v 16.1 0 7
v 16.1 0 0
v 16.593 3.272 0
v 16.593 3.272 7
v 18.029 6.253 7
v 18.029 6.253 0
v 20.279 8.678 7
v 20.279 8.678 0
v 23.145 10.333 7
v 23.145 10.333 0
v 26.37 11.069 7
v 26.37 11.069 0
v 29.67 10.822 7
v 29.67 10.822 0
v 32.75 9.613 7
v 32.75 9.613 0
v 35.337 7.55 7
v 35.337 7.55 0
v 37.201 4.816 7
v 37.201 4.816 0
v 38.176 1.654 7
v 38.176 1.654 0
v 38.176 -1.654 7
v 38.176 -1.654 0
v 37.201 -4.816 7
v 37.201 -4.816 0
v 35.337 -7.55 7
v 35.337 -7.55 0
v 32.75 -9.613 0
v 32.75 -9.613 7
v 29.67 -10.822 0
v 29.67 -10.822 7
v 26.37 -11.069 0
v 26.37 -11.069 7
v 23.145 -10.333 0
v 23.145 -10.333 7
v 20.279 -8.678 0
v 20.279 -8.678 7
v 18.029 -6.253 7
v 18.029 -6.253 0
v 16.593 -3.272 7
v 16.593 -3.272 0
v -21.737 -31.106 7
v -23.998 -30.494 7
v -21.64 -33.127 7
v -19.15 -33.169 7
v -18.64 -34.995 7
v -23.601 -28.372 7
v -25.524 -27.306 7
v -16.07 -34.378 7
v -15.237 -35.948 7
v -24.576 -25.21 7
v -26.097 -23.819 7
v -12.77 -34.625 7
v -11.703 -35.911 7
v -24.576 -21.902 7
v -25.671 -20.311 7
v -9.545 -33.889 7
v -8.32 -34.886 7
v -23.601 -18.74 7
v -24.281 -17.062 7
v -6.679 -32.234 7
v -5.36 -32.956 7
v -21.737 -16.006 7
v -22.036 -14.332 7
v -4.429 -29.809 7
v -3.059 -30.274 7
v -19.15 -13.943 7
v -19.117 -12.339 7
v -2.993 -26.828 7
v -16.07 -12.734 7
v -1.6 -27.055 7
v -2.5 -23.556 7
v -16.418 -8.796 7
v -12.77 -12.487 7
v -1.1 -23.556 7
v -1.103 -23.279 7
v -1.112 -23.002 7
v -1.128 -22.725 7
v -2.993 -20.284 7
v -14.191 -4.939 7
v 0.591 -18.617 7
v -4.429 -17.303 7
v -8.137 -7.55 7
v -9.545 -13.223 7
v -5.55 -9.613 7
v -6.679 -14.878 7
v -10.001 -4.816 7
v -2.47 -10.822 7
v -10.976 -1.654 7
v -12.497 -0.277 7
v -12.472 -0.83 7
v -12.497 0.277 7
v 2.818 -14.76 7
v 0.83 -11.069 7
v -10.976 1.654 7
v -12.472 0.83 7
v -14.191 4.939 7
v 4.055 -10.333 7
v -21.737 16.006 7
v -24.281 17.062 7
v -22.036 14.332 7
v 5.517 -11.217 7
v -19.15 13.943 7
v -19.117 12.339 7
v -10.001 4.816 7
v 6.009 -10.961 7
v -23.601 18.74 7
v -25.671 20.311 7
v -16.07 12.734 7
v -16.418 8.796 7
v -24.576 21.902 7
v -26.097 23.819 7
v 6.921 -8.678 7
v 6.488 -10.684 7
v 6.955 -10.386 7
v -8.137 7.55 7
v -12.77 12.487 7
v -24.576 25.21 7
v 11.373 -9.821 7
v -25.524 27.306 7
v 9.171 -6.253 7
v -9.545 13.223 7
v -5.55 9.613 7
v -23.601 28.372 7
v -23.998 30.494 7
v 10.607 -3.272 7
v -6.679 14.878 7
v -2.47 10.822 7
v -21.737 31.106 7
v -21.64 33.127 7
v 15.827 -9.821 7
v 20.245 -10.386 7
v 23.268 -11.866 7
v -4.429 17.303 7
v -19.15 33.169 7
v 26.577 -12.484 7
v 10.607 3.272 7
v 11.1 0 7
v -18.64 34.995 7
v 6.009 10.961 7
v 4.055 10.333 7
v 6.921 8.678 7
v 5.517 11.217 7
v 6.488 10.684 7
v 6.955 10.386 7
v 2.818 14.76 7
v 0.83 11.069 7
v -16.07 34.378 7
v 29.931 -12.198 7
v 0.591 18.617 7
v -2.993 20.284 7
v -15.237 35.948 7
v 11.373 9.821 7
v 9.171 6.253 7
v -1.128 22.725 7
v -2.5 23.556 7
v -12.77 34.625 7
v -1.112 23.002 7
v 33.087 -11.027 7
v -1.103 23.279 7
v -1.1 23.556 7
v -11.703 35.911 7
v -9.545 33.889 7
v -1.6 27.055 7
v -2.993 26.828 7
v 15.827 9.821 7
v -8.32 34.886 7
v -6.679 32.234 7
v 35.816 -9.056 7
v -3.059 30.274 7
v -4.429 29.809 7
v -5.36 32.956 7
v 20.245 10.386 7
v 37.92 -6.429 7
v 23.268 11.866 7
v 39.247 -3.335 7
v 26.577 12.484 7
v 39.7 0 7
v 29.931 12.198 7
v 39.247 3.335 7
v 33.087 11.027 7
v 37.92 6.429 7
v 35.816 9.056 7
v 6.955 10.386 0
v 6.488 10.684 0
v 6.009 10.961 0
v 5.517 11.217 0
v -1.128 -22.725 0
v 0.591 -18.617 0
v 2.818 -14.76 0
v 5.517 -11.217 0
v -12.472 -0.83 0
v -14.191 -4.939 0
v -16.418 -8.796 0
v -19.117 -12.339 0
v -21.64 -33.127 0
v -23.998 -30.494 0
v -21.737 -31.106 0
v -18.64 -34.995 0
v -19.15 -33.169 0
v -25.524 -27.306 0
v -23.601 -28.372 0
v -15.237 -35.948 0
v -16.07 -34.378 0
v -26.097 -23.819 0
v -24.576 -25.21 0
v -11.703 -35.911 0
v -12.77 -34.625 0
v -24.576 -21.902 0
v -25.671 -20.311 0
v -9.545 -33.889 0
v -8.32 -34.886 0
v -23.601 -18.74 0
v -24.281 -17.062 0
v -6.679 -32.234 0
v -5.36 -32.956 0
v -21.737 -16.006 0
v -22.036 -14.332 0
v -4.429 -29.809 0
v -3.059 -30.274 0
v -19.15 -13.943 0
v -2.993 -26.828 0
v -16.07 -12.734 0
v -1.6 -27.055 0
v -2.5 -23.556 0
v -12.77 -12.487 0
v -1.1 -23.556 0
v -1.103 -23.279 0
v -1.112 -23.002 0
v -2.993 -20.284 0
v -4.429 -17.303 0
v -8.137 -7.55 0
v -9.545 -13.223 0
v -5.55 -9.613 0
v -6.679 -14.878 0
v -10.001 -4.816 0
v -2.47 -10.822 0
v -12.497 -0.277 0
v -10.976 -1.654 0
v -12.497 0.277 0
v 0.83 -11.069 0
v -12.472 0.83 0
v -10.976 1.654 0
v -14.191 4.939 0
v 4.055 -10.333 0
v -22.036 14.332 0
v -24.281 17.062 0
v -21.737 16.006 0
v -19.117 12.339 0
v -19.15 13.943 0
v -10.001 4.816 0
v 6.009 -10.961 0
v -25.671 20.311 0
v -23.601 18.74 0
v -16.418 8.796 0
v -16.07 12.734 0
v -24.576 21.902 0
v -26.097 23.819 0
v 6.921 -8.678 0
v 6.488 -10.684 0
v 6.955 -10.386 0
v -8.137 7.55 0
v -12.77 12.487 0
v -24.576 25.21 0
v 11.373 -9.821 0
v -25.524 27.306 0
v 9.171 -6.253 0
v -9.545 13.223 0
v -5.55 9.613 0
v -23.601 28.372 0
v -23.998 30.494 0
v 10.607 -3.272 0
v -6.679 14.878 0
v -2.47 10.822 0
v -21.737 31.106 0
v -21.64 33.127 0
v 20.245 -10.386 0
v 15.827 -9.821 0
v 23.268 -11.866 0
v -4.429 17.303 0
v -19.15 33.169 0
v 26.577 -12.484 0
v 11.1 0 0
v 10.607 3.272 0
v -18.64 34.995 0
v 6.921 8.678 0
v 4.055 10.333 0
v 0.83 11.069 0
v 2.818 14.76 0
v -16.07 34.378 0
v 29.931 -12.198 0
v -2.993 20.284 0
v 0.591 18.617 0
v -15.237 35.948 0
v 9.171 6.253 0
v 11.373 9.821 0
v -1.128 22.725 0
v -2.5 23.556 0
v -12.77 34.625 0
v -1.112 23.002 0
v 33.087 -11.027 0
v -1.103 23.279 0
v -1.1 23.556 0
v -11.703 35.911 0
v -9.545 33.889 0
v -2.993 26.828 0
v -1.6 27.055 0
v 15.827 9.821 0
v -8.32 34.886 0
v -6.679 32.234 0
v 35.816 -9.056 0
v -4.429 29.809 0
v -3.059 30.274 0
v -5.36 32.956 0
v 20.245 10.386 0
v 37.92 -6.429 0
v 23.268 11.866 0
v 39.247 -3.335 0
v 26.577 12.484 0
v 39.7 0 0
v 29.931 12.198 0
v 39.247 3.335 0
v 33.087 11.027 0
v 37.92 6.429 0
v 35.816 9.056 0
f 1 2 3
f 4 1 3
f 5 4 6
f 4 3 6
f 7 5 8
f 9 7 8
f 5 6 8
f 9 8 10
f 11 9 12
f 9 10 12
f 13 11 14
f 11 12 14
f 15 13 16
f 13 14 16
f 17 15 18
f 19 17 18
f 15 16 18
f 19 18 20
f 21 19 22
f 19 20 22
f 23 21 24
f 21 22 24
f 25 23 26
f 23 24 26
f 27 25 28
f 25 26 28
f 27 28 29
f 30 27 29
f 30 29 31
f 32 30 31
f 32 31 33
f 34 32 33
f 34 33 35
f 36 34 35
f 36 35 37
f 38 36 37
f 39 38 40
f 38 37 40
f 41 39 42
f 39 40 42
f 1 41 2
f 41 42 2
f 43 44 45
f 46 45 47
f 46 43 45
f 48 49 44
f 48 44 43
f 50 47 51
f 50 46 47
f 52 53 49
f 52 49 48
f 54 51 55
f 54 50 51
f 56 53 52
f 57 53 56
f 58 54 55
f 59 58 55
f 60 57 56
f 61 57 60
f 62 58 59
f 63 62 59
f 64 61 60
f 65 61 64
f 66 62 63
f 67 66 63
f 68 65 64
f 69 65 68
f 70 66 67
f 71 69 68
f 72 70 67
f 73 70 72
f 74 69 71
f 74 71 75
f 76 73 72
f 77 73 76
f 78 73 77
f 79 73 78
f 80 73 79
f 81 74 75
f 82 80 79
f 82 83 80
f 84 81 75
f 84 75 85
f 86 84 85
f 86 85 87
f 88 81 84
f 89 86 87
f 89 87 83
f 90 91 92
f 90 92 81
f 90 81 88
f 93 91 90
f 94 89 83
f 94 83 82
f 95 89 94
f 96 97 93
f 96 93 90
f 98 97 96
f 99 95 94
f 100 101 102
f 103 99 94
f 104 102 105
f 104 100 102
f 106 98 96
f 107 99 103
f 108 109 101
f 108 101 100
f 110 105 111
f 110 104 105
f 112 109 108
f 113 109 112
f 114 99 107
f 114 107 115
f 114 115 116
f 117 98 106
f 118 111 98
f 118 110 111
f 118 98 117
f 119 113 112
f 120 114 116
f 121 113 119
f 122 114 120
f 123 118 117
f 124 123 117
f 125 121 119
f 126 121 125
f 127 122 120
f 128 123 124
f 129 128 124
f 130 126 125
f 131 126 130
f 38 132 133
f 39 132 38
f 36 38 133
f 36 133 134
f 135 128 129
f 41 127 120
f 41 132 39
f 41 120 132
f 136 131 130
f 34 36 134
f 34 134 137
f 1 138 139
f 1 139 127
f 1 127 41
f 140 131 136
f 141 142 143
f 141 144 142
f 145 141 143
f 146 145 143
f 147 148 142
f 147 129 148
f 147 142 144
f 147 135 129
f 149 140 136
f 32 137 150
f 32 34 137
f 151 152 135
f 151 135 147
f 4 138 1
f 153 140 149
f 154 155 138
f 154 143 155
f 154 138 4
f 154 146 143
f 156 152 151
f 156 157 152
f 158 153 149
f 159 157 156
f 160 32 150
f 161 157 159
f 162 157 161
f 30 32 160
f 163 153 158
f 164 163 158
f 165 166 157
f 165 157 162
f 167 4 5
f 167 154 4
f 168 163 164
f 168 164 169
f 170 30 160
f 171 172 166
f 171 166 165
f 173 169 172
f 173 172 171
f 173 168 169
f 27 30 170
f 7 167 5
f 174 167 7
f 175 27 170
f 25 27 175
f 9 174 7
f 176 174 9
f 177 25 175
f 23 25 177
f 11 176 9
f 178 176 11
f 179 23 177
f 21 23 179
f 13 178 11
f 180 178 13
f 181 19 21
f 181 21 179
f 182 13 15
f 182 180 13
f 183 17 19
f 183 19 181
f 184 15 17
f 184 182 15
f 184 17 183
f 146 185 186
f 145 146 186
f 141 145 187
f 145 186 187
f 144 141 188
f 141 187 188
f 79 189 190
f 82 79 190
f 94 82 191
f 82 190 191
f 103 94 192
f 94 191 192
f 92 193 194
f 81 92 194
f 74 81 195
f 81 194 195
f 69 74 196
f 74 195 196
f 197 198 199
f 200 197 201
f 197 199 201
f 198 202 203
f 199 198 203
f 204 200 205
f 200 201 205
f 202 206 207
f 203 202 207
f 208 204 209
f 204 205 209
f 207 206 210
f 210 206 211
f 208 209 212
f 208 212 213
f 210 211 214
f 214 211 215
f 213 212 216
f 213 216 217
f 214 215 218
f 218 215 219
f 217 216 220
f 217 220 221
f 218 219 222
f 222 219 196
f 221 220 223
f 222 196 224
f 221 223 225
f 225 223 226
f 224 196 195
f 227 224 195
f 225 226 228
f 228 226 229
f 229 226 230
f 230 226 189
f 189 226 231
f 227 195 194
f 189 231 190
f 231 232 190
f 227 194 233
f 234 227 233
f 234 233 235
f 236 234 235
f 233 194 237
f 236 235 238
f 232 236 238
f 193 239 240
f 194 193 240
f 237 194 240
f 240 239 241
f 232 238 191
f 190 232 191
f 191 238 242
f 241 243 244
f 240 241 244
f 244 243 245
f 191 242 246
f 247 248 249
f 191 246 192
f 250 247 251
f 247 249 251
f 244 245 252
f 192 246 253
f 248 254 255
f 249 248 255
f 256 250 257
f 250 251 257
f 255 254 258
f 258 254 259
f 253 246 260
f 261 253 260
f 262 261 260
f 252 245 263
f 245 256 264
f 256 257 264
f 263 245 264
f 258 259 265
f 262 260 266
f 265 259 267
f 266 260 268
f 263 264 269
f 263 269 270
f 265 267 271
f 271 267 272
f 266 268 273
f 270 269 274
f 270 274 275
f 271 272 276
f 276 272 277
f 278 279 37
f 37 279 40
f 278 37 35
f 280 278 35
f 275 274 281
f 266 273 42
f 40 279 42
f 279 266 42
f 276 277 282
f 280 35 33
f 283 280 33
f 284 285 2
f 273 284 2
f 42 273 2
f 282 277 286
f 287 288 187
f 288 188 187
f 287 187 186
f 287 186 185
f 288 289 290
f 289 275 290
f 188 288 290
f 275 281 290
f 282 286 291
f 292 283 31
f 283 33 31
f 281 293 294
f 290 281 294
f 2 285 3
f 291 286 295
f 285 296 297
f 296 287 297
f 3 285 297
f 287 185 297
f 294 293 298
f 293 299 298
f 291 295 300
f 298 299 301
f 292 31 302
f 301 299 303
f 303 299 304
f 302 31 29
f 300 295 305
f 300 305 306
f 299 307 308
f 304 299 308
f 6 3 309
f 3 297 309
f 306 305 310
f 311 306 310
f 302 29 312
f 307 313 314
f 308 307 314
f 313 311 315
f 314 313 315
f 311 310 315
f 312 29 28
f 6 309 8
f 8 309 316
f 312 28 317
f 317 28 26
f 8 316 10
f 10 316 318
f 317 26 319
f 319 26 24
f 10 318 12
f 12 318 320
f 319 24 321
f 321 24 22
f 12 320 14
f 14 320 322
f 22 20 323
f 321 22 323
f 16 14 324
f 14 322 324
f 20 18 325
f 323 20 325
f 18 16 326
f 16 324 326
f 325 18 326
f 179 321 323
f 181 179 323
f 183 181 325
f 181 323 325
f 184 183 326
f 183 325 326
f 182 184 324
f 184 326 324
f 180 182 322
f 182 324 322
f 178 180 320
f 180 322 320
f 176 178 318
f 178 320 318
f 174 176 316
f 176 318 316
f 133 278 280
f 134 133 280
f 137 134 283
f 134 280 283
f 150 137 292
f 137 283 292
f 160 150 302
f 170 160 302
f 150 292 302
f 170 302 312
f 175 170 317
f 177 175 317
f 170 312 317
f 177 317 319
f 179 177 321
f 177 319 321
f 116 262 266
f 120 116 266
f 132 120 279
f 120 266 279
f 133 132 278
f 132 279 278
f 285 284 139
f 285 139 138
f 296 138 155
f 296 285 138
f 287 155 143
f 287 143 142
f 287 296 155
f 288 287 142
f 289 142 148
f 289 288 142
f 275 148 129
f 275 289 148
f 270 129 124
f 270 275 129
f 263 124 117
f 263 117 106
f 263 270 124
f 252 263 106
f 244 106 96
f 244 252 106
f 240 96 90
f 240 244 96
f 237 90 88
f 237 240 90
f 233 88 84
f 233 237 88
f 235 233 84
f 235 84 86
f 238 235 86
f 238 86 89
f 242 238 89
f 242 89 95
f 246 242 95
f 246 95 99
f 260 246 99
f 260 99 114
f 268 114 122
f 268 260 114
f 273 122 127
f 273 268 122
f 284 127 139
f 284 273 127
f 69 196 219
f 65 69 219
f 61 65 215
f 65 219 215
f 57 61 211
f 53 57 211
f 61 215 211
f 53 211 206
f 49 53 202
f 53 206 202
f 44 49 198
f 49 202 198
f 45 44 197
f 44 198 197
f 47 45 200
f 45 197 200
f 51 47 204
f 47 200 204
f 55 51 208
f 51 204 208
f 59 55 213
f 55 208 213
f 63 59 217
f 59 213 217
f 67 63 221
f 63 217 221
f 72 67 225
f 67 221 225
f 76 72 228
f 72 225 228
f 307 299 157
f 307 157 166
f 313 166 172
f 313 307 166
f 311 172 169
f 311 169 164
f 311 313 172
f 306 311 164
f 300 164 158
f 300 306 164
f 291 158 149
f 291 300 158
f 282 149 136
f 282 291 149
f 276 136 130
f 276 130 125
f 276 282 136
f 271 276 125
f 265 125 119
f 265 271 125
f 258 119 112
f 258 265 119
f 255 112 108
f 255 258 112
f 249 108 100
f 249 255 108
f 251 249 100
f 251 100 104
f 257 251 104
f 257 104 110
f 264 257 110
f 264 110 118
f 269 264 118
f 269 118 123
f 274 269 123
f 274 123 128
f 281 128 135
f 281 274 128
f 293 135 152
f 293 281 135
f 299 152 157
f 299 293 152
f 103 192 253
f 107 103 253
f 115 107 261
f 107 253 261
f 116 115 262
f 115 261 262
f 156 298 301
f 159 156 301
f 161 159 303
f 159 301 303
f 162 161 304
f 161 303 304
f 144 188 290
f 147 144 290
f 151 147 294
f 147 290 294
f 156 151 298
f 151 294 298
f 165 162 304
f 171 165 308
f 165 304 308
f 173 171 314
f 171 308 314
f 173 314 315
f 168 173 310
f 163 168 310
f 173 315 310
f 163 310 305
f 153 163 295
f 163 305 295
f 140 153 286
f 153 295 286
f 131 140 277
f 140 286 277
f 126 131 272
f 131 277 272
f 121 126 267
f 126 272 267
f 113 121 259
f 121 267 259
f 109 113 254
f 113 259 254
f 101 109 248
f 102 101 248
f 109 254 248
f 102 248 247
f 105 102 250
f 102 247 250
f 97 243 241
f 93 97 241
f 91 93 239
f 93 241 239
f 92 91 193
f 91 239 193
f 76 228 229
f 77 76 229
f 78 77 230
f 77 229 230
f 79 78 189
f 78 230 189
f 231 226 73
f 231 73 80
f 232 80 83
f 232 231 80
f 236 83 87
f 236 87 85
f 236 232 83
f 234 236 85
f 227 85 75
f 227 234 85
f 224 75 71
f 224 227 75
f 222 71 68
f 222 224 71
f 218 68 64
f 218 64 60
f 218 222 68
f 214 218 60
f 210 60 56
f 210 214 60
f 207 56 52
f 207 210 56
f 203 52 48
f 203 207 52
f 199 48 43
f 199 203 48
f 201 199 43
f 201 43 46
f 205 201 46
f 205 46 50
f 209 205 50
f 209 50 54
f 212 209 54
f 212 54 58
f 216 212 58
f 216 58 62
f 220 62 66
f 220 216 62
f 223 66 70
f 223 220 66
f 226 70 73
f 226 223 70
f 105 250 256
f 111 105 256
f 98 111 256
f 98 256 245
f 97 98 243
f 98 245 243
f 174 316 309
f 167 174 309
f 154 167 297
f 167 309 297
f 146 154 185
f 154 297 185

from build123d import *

# Parameters (mm, degrees)
F0_R     = 11.1
F1_DEPTH = 7


with BuildPart() as f1:
    # F0 (on Top) → F1 (new body)
    with BuildSketch(Plane.XY):
        with BuildLine():
            ThreePointArc((6.955402, -10.386163), (11.02707, -5.886742), (12.5, 0))
            ThreePointArc((12.5, 0), (11.02707, 5.886742), (6.955402, 10.386163))
            ThreePointArc((6.955402, 10.386163), (6.25, 10.825318), (5.51698, 11.216636))
            ThreePointArc((5.51698, 11.216636), (-6.25, 10.825318), (-12.472382, 0.830473))
            ThreePointArc((-12.472382, 0.830473), (-12.5, 0), (-12.472382, -0.830473))
            ThreePointArc((-12.472382, -0.830473), (-6.25, -10.825318), (5.51698, -11.216636))
            ThreePointArc((5.51698, -11.216636), (6.25, -10.825318), (6.955402, -10.386163))
        make_face()
        Circle(F0_R, mode=Mode.SUBTRACT)
        with BuildLine():
            ThreePointArc((6.955402, 10.386163), (11.02707, 5.886742), (12.5, 0))
            Line((12.5, 0), (14.7, 0))
            ThreePointArc((14.7, 0), (16.17293, 5.886742), (20.244598, 10.386163))
            ThreePointArc((20.244598, 10.386163), (13.6, 9.749651), (6.955402, 10.386163))
        make_face()
        with BuildLine():
            Line((14.7, 0), (12.5, 0))
            ThreePointArc((12.5, 0), (11.02707, -5.886742), (6.955402, -10.386163))
            ThreePointArc((6.955402, -10.386163), (13.6, -9.749651), (20.244598, -10.386163))
            ThreePointArc((20.244598, -10.386163), (16.17293, -5.886742), (14.7, 0))
        make_face()
        with BuildLine():
            ThreePointArc((38.3, 0), (27.2, 11.1), (16.1, 0))
            ThreePointArc((16.1, 0), (27.2, -11.1), (38.3, 0))
        make_face()
        with BuildLine():
            ThreePointArc((20.244598, 10.386163), (16.17293, 5.886742), (14.7, 0))
            ThreePointArc((14.7, 0), (16.17293, -5.886742), (20.244598, -10.386163))
            ThreePointArc((20.244598, -10.386163), (33.086742, -11.02707), (39.7, 0))
            ThreePointArc((39.7, 0), (33.086742, 11.02707), (20.244598, 10.386163))
        make_face()
        with BuildLine():
            ThreePointArc((38.3, 0), (27.2, -11.1), (16.1, 0))
            ThreePointArc((16.1, 0), (27.2, 11.1), (38.3, 0))
        make_face(mode=Mode.SUBTRACT)
        with BuildLine():
            ThreePointArc((-12.472382, 0.830473), (-6.25, 10.825318), (5.51698, 11.216636))
            ThreePointArc((5.51698, 11.216636), (1.643446, 16.652771), (-1.127618, 22.725418))
            ThreePointArc((-1.127618, 22.725418), (-7.35, 12.730573), (-19.11698, 12.339255))
            ThreePointArc((-19.11698, 12.339255), (-15.243446, 6.90312), (-12.472382, 0.830473))
        make_face()
        with BuildLine():
            ThreePointArc((-1.127618, -22.725418), (1.643446, -16.652771), (5.51698, -11.216636))
            ThreePointArc((5.51698, -11.216636), (-6.25, -10.825318), (-12.472382, -0.830473))
            ThreePointArc((-12.472382, -0.830473), (-15.243446, -6.90312), (-19.11698, -12.339255))
            ThreePointArc((-19.11698, -12.339255), (-7.35, -12.730573), (-1.127618, -22.725418))
        make_face()
        with BuildLine():
            ThreePointArc((-19.11698, 12.339255), (-7.35, 12.730573), (-1.127618, 22.725418))
            ThreePointArc((-1.127618, 22.725418), (-1.106906, 23.140425), (-1.1, 23.555891))
            ThreePointArc((-1.1, 23.555891), (-20.206351, 34.167494), (-19.11698, 12.339255))
        make_face()
        with Locations((-13.6, 23.555891)):
            Circle(F0_R, mode=Mode.SUBTRACT)
        with BuildLine():
            ThreePointArc((-1.1, -23.555891), (-1.106906, -23.140425), (-1.127618, -22.725418))
            ThreePointArc((-1.127618, -22.725418), (-7.35, -12.730573), (-19.11698, -12.339255))
            ThreePointArc((-19.11698, -12.339255), (-20.206351, -34.167494), (-1.1, -23.555891))
        make_face()
        with Locations((-13.6, -23.555891)):
            Circle(F0_R, mode=Mode.SUBTRACT)
    extrude(amount=F1_DEPTH)


solid = f1.part
